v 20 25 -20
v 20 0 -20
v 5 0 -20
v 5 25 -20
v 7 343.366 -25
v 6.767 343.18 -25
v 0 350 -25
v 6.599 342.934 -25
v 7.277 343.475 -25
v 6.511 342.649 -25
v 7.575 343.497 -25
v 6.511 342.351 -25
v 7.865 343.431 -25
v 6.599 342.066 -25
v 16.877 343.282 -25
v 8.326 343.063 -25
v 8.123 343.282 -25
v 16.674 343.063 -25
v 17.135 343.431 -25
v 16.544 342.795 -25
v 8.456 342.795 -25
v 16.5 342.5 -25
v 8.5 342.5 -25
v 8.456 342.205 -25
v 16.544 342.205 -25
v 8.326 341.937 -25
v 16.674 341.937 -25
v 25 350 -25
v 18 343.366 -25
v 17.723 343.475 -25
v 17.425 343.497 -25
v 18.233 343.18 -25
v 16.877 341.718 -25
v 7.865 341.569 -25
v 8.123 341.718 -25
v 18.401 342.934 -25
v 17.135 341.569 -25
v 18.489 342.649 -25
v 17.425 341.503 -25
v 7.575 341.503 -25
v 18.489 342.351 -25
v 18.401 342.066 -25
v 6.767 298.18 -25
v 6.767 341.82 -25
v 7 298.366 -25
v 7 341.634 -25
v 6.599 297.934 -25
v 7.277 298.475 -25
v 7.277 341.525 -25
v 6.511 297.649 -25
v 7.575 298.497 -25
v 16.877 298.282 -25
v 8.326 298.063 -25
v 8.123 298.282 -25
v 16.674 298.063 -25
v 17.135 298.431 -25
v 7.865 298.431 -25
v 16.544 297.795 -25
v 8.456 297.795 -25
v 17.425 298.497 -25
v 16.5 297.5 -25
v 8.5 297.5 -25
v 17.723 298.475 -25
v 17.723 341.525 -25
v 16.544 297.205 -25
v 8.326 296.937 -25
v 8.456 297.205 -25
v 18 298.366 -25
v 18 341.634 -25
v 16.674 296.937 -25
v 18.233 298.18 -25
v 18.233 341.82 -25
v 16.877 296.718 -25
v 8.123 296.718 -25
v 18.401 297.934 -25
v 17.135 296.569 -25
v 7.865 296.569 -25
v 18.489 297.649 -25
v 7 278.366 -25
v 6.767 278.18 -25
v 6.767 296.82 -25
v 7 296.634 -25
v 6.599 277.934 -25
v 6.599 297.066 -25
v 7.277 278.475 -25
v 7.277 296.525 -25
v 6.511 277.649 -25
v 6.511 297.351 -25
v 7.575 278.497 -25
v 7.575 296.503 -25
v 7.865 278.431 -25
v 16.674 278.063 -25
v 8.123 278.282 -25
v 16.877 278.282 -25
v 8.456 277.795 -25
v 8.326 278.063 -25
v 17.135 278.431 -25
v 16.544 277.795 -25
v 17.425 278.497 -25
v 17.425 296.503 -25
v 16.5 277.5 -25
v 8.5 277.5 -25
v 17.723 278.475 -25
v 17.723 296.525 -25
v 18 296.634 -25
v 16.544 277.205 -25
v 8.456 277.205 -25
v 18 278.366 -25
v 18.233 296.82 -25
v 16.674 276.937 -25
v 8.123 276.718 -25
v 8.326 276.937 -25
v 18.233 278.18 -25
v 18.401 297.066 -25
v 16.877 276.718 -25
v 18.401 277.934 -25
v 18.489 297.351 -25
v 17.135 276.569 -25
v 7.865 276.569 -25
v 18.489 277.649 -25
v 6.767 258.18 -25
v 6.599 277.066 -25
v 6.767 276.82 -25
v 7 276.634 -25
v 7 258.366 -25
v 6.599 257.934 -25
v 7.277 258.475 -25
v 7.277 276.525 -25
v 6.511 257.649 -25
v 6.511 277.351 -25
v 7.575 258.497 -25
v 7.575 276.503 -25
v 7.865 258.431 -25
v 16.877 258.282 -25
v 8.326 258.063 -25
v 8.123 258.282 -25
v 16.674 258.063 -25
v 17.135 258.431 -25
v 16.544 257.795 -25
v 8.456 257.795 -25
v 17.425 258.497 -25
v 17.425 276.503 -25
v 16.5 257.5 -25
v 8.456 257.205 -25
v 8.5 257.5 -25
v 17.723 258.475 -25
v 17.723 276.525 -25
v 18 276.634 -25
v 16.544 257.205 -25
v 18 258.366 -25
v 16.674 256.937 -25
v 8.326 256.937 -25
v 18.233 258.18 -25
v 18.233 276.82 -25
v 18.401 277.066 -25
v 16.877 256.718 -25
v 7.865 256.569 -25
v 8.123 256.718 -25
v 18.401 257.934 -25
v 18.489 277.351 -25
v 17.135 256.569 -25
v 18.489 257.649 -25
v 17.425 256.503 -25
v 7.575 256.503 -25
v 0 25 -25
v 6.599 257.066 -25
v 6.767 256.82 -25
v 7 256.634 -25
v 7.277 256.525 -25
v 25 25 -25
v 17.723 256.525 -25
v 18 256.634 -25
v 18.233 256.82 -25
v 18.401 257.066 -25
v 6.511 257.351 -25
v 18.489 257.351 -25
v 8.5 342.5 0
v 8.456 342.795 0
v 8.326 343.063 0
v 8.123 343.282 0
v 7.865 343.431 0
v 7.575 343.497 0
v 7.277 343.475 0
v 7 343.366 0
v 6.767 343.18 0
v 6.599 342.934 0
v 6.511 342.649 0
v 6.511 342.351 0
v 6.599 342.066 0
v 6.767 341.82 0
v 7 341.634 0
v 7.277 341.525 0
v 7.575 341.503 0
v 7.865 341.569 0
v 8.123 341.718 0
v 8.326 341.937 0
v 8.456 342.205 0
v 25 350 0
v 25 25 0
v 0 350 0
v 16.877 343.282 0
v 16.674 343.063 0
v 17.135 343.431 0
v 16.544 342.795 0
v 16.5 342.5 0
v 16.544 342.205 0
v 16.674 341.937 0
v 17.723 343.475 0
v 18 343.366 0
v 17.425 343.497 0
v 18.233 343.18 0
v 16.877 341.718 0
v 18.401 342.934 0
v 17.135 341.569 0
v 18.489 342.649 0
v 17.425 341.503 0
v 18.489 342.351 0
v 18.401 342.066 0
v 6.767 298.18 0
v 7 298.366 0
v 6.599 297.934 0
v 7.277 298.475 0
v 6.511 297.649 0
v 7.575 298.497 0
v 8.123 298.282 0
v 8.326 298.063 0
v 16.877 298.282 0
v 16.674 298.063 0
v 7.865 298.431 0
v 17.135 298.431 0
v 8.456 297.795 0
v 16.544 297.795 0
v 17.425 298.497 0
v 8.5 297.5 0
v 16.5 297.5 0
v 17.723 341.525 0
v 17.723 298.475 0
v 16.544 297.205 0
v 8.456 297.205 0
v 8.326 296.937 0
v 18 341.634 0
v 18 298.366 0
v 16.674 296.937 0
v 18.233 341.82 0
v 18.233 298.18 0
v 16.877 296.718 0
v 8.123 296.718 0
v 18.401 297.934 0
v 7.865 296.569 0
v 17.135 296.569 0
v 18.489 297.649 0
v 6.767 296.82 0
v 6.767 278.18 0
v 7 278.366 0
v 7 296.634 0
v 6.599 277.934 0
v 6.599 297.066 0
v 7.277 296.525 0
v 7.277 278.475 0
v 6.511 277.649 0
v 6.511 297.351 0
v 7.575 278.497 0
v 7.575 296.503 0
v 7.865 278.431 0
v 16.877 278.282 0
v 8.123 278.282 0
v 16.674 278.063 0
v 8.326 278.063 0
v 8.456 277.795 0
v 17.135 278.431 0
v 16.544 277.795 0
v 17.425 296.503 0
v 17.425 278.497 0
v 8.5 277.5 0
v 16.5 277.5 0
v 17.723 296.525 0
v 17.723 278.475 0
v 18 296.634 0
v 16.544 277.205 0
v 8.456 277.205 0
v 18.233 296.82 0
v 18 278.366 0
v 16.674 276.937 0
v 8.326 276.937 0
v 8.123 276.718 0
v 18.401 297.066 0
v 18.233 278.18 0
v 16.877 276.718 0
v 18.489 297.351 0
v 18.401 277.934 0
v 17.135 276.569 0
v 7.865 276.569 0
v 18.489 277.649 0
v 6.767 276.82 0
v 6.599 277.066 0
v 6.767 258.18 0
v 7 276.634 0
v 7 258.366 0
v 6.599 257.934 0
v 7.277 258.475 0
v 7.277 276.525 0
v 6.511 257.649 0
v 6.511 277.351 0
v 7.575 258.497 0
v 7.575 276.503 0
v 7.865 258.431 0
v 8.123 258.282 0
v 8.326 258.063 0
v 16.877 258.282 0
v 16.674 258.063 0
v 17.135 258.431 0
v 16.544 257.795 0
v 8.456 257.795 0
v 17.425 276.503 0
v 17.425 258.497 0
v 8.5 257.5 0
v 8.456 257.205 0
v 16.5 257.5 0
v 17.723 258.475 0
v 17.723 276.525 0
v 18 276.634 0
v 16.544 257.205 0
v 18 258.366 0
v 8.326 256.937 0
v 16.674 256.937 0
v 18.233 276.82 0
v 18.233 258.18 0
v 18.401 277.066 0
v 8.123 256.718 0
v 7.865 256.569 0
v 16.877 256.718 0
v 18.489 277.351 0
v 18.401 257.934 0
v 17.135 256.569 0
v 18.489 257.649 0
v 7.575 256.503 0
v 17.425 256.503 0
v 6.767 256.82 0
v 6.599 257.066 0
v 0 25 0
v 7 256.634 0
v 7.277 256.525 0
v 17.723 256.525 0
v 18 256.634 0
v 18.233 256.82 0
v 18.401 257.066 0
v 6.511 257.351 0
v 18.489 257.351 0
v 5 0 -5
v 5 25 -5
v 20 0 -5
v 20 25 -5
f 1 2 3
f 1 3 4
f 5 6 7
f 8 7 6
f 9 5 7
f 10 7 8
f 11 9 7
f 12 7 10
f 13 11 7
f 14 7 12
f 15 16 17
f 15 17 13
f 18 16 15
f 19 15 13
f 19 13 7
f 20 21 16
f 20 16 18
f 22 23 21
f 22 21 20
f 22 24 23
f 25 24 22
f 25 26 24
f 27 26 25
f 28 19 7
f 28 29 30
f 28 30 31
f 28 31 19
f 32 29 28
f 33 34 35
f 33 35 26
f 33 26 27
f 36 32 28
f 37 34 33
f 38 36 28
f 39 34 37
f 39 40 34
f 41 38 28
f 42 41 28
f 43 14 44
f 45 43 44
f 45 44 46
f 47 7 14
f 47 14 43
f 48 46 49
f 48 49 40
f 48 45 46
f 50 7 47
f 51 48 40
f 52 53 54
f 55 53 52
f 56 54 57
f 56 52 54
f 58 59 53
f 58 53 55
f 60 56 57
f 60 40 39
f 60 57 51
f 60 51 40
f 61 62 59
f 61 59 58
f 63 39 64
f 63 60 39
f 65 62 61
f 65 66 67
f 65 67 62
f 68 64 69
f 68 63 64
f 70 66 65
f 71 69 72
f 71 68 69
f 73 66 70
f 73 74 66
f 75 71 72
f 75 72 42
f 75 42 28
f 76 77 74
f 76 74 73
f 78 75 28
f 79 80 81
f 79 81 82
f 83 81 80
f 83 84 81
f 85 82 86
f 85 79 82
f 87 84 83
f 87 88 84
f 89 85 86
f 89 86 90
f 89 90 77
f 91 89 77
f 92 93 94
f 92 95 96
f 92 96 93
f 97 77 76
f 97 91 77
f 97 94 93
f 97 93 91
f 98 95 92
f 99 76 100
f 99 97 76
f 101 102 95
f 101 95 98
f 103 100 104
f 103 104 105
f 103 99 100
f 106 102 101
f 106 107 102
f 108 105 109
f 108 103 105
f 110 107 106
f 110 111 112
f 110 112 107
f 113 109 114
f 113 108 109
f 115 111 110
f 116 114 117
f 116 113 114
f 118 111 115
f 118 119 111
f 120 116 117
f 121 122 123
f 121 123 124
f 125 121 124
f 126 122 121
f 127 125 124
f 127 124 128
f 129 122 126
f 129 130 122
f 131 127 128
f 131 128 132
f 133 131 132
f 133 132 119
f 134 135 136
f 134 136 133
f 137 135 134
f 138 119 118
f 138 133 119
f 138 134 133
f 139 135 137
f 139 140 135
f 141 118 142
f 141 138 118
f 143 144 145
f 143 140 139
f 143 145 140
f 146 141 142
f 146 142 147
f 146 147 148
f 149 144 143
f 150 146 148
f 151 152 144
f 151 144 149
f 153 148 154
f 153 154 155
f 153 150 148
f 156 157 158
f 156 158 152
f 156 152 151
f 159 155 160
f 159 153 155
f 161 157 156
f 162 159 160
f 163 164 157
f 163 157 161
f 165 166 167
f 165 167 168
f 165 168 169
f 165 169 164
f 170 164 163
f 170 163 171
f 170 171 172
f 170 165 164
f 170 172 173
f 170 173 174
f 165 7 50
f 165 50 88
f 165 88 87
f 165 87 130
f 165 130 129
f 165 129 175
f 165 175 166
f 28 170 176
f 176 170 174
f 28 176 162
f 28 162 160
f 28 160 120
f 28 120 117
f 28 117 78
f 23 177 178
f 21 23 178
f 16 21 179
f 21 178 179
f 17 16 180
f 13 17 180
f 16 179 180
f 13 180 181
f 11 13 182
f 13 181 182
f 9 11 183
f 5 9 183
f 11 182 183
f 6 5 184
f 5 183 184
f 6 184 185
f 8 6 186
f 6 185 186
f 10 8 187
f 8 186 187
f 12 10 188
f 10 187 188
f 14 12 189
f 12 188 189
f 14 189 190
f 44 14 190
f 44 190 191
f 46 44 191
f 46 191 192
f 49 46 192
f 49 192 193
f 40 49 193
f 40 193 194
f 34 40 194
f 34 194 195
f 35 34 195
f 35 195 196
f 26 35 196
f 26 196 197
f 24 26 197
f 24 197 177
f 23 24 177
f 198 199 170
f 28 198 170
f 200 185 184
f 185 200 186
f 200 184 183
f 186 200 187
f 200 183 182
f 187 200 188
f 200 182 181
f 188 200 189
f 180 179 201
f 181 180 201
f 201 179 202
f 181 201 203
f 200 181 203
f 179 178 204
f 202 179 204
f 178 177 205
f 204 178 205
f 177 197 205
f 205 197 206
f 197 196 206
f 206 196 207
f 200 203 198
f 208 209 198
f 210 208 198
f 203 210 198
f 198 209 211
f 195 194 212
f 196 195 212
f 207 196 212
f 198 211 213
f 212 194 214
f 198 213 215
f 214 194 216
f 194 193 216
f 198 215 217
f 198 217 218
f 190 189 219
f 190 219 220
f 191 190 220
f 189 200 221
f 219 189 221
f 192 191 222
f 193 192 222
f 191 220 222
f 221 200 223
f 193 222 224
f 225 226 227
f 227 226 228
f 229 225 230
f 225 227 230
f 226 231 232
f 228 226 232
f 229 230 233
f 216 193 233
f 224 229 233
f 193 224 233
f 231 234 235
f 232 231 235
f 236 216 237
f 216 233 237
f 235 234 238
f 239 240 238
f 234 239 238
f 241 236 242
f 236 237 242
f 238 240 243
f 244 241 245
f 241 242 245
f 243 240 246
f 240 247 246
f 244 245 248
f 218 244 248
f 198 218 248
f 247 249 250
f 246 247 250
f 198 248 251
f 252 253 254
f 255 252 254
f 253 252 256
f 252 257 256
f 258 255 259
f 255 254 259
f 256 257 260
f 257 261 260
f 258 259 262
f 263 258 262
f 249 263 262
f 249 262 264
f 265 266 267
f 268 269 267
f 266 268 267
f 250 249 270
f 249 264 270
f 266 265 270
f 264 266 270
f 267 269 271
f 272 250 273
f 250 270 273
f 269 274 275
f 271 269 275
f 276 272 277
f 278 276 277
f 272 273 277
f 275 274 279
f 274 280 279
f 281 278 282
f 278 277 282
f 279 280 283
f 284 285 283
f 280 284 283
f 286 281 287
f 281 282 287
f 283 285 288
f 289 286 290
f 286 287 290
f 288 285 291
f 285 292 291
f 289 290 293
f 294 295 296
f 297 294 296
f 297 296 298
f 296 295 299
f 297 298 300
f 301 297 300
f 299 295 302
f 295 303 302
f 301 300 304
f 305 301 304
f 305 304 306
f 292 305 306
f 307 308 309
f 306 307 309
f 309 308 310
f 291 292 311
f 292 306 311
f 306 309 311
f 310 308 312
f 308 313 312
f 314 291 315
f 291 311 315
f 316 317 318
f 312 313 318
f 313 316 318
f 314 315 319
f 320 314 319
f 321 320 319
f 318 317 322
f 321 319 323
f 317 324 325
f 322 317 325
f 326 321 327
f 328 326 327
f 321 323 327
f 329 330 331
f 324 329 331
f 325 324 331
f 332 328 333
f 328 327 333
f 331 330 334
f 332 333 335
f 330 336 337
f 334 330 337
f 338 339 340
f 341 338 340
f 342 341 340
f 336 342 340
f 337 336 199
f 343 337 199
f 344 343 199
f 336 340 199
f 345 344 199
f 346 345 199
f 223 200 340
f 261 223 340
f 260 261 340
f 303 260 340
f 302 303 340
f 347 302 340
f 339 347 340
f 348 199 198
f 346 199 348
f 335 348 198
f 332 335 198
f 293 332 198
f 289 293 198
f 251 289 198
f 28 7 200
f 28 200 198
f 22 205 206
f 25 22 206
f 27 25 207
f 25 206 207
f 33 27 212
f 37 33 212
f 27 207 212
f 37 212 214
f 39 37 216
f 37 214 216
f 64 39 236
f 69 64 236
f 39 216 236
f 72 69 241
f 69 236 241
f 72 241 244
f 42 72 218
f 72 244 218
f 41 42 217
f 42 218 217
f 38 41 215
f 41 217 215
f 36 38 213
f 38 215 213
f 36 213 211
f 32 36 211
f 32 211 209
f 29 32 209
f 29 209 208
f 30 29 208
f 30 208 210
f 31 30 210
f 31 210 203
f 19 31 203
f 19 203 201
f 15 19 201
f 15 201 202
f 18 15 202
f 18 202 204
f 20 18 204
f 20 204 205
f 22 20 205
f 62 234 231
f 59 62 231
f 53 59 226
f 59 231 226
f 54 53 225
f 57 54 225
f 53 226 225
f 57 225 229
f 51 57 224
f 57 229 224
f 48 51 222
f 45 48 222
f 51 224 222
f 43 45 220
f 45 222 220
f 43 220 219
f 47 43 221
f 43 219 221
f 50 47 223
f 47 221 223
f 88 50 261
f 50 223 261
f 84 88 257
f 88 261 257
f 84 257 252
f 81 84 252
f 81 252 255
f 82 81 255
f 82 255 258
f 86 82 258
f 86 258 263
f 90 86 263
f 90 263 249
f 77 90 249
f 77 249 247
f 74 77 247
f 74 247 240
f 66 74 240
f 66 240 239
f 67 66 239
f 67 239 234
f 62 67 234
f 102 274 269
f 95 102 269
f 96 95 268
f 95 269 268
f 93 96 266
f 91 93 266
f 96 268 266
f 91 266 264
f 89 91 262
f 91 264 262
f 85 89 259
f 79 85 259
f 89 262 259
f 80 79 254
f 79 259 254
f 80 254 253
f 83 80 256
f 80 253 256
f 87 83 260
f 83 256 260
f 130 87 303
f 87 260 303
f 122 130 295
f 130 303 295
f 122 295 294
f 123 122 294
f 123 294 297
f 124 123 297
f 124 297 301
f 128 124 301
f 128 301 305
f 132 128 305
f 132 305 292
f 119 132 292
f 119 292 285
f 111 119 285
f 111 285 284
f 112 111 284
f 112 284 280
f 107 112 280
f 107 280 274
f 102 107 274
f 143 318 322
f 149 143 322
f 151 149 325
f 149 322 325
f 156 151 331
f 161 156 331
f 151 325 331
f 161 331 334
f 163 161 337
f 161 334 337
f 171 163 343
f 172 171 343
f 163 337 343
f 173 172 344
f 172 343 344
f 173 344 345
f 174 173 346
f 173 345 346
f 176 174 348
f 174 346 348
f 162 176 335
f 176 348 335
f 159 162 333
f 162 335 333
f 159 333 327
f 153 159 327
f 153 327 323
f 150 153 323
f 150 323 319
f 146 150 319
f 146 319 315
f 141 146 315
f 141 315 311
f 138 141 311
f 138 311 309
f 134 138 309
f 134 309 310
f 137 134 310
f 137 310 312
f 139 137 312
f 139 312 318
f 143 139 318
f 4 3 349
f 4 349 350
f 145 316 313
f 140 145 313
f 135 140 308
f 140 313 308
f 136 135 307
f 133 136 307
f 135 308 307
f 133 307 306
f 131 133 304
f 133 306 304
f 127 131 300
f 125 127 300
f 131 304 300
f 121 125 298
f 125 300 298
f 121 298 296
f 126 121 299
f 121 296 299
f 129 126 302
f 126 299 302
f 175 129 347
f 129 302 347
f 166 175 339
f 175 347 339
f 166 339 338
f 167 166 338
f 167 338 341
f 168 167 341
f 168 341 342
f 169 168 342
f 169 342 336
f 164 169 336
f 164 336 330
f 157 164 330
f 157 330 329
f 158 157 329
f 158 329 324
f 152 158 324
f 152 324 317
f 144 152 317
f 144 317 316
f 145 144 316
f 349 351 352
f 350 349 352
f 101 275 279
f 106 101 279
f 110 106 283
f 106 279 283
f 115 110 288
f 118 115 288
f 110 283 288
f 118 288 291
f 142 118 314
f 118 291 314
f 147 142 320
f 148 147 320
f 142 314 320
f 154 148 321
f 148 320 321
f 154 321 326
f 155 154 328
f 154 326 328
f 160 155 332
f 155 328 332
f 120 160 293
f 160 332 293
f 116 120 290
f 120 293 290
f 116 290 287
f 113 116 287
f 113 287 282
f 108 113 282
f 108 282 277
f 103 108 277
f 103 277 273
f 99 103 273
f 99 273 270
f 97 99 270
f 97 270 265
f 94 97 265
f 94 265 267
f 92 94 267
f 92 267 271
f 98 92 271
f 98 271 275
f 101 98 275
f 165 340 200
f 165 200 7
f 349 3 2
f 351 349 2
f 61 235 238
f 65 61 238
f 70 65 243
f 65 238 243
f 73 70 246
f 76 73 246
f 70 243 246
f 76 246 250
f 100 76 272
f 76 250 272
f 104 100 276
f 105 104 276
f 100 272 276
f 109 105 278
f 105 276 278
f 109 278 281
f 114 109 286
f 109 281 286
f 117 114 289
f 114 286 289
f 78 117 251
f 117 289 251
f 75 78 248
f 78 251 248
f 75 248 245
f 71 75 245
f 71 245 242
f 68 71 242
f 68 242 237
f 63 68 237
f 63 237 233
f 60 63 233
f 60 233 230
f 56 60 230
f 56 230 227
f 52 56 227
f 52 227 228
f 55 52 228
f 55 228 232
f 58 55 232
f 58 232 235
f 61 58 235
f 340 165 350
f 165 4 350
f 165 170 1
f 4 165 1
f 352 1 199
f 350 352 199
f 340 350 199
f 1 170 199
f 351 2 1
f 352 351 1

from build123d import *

# Parameters (mm, degrees)
SKETCH2_W               = 25
SKETCH2_H               = 25
BOSS_EXTRUDE1_DEPTH     = 350
SKETCH3_R               = 1
CUT_EXTRUDE1_DEPTH      = 352.781181987
CUT_EXTRUDE2_DEPTH      = 352.781181987
CUT_EXTRUDE2_DEPTH_BACK = 352.781181987
SKETCH4_W               = 5
SKETCH4_H               = 25
SKETCH5_W               = 5
SKETCH5_H               = 25
CUT_EXTRUDE3_DEPTH      = 352.461235416


with BuildPart() as part:
    # Sketch2 → Boss-Extrude1 (new body)
    with BuildSketch(Plane(origin=(0, 0, 0), x_dir=(1, 0, 0), z_dir=(0, 1, 0))):
        with Locations((12.5, 12.5)):
            Rectangle(SKETCH2_W, SKETCH2_H)
    extrude(amount=BOSS_EXTRUDE1_DEPTH)

    # Sketch3 → Cut-Extrude1 (cut, through all)
    with BuildSketch(Plane.XY):
        with Locations((7.5, 342.5)):
            Circle(SKETCH3_R)
        with Locations((7.5, 297.5)):
            Circle(SKETCH3_R)
        with Locations((7.5, 277.5)):
            Circle(SKETCH3_R)
        with Locations((7.5, 257.5)):
            Circle(SKETCH3_R)
        with Locations(Location((17.5, 342.5, 0), (0, 0, 180))):
            Circle(SKETCH3_R)
        with Locations(Location((17.5, 297.5, 0), (0, 0, 180))):
            Circle(SKETCH3_R)
        with Locations(Location((17.5, 277.5, 0), (0, 0, 180))):
            Circle(SKETCH3_R)
        with Locations(Location((17.5, 257.5, 0), (0, 0, 180))):
            Circle(SKETCH3_R)
    extrude(amount=-CUT_EXTRUDE1_DEPTH, mode=Mode.SUBTRACT)

    # Sketch4 → Cut-Extrude2 (cut, two sides: drawn at the far end of the back side and taken through both)
    with BuildSketch(Plane.ZY.offset(-CUT_EXTRUDE2_DEPTH_BACK)):
        with Locations((-22.5, 12.5)):
            Rectangle(SKETCH4_W, SKETCH4_H)
        with Locations((-2.5, 12.5)):
            Rectangle(SKETCH4_W, SKETCH4_H)
    extrude(amount=CUT_EXTRUDE2_DEPTH + CUT_EXTRUDE2_DEPTH_BACK, mode=Mode.SUBTRACT)

    # Sketch5 → Cut-Extrude3 (cut, through all)
    with BuildSketch(Plane(origin=(0, 0, -20), x_dir=(-1, 0, 0), z_dir=(0, 0, -1))):
        with Locations((-22.5, 12.5)):
            Rectangle(SKETCH5_W, SKETCH5_H)
        with Locations((-2.5, 12.5)):
            Rectangle(SKETCH5_W, SKETCH5_H)
    extrude(amount=-CUT_EXTRUDE3_DEPTH, mode=Mode.SUBTRACT)


solid = part.part
